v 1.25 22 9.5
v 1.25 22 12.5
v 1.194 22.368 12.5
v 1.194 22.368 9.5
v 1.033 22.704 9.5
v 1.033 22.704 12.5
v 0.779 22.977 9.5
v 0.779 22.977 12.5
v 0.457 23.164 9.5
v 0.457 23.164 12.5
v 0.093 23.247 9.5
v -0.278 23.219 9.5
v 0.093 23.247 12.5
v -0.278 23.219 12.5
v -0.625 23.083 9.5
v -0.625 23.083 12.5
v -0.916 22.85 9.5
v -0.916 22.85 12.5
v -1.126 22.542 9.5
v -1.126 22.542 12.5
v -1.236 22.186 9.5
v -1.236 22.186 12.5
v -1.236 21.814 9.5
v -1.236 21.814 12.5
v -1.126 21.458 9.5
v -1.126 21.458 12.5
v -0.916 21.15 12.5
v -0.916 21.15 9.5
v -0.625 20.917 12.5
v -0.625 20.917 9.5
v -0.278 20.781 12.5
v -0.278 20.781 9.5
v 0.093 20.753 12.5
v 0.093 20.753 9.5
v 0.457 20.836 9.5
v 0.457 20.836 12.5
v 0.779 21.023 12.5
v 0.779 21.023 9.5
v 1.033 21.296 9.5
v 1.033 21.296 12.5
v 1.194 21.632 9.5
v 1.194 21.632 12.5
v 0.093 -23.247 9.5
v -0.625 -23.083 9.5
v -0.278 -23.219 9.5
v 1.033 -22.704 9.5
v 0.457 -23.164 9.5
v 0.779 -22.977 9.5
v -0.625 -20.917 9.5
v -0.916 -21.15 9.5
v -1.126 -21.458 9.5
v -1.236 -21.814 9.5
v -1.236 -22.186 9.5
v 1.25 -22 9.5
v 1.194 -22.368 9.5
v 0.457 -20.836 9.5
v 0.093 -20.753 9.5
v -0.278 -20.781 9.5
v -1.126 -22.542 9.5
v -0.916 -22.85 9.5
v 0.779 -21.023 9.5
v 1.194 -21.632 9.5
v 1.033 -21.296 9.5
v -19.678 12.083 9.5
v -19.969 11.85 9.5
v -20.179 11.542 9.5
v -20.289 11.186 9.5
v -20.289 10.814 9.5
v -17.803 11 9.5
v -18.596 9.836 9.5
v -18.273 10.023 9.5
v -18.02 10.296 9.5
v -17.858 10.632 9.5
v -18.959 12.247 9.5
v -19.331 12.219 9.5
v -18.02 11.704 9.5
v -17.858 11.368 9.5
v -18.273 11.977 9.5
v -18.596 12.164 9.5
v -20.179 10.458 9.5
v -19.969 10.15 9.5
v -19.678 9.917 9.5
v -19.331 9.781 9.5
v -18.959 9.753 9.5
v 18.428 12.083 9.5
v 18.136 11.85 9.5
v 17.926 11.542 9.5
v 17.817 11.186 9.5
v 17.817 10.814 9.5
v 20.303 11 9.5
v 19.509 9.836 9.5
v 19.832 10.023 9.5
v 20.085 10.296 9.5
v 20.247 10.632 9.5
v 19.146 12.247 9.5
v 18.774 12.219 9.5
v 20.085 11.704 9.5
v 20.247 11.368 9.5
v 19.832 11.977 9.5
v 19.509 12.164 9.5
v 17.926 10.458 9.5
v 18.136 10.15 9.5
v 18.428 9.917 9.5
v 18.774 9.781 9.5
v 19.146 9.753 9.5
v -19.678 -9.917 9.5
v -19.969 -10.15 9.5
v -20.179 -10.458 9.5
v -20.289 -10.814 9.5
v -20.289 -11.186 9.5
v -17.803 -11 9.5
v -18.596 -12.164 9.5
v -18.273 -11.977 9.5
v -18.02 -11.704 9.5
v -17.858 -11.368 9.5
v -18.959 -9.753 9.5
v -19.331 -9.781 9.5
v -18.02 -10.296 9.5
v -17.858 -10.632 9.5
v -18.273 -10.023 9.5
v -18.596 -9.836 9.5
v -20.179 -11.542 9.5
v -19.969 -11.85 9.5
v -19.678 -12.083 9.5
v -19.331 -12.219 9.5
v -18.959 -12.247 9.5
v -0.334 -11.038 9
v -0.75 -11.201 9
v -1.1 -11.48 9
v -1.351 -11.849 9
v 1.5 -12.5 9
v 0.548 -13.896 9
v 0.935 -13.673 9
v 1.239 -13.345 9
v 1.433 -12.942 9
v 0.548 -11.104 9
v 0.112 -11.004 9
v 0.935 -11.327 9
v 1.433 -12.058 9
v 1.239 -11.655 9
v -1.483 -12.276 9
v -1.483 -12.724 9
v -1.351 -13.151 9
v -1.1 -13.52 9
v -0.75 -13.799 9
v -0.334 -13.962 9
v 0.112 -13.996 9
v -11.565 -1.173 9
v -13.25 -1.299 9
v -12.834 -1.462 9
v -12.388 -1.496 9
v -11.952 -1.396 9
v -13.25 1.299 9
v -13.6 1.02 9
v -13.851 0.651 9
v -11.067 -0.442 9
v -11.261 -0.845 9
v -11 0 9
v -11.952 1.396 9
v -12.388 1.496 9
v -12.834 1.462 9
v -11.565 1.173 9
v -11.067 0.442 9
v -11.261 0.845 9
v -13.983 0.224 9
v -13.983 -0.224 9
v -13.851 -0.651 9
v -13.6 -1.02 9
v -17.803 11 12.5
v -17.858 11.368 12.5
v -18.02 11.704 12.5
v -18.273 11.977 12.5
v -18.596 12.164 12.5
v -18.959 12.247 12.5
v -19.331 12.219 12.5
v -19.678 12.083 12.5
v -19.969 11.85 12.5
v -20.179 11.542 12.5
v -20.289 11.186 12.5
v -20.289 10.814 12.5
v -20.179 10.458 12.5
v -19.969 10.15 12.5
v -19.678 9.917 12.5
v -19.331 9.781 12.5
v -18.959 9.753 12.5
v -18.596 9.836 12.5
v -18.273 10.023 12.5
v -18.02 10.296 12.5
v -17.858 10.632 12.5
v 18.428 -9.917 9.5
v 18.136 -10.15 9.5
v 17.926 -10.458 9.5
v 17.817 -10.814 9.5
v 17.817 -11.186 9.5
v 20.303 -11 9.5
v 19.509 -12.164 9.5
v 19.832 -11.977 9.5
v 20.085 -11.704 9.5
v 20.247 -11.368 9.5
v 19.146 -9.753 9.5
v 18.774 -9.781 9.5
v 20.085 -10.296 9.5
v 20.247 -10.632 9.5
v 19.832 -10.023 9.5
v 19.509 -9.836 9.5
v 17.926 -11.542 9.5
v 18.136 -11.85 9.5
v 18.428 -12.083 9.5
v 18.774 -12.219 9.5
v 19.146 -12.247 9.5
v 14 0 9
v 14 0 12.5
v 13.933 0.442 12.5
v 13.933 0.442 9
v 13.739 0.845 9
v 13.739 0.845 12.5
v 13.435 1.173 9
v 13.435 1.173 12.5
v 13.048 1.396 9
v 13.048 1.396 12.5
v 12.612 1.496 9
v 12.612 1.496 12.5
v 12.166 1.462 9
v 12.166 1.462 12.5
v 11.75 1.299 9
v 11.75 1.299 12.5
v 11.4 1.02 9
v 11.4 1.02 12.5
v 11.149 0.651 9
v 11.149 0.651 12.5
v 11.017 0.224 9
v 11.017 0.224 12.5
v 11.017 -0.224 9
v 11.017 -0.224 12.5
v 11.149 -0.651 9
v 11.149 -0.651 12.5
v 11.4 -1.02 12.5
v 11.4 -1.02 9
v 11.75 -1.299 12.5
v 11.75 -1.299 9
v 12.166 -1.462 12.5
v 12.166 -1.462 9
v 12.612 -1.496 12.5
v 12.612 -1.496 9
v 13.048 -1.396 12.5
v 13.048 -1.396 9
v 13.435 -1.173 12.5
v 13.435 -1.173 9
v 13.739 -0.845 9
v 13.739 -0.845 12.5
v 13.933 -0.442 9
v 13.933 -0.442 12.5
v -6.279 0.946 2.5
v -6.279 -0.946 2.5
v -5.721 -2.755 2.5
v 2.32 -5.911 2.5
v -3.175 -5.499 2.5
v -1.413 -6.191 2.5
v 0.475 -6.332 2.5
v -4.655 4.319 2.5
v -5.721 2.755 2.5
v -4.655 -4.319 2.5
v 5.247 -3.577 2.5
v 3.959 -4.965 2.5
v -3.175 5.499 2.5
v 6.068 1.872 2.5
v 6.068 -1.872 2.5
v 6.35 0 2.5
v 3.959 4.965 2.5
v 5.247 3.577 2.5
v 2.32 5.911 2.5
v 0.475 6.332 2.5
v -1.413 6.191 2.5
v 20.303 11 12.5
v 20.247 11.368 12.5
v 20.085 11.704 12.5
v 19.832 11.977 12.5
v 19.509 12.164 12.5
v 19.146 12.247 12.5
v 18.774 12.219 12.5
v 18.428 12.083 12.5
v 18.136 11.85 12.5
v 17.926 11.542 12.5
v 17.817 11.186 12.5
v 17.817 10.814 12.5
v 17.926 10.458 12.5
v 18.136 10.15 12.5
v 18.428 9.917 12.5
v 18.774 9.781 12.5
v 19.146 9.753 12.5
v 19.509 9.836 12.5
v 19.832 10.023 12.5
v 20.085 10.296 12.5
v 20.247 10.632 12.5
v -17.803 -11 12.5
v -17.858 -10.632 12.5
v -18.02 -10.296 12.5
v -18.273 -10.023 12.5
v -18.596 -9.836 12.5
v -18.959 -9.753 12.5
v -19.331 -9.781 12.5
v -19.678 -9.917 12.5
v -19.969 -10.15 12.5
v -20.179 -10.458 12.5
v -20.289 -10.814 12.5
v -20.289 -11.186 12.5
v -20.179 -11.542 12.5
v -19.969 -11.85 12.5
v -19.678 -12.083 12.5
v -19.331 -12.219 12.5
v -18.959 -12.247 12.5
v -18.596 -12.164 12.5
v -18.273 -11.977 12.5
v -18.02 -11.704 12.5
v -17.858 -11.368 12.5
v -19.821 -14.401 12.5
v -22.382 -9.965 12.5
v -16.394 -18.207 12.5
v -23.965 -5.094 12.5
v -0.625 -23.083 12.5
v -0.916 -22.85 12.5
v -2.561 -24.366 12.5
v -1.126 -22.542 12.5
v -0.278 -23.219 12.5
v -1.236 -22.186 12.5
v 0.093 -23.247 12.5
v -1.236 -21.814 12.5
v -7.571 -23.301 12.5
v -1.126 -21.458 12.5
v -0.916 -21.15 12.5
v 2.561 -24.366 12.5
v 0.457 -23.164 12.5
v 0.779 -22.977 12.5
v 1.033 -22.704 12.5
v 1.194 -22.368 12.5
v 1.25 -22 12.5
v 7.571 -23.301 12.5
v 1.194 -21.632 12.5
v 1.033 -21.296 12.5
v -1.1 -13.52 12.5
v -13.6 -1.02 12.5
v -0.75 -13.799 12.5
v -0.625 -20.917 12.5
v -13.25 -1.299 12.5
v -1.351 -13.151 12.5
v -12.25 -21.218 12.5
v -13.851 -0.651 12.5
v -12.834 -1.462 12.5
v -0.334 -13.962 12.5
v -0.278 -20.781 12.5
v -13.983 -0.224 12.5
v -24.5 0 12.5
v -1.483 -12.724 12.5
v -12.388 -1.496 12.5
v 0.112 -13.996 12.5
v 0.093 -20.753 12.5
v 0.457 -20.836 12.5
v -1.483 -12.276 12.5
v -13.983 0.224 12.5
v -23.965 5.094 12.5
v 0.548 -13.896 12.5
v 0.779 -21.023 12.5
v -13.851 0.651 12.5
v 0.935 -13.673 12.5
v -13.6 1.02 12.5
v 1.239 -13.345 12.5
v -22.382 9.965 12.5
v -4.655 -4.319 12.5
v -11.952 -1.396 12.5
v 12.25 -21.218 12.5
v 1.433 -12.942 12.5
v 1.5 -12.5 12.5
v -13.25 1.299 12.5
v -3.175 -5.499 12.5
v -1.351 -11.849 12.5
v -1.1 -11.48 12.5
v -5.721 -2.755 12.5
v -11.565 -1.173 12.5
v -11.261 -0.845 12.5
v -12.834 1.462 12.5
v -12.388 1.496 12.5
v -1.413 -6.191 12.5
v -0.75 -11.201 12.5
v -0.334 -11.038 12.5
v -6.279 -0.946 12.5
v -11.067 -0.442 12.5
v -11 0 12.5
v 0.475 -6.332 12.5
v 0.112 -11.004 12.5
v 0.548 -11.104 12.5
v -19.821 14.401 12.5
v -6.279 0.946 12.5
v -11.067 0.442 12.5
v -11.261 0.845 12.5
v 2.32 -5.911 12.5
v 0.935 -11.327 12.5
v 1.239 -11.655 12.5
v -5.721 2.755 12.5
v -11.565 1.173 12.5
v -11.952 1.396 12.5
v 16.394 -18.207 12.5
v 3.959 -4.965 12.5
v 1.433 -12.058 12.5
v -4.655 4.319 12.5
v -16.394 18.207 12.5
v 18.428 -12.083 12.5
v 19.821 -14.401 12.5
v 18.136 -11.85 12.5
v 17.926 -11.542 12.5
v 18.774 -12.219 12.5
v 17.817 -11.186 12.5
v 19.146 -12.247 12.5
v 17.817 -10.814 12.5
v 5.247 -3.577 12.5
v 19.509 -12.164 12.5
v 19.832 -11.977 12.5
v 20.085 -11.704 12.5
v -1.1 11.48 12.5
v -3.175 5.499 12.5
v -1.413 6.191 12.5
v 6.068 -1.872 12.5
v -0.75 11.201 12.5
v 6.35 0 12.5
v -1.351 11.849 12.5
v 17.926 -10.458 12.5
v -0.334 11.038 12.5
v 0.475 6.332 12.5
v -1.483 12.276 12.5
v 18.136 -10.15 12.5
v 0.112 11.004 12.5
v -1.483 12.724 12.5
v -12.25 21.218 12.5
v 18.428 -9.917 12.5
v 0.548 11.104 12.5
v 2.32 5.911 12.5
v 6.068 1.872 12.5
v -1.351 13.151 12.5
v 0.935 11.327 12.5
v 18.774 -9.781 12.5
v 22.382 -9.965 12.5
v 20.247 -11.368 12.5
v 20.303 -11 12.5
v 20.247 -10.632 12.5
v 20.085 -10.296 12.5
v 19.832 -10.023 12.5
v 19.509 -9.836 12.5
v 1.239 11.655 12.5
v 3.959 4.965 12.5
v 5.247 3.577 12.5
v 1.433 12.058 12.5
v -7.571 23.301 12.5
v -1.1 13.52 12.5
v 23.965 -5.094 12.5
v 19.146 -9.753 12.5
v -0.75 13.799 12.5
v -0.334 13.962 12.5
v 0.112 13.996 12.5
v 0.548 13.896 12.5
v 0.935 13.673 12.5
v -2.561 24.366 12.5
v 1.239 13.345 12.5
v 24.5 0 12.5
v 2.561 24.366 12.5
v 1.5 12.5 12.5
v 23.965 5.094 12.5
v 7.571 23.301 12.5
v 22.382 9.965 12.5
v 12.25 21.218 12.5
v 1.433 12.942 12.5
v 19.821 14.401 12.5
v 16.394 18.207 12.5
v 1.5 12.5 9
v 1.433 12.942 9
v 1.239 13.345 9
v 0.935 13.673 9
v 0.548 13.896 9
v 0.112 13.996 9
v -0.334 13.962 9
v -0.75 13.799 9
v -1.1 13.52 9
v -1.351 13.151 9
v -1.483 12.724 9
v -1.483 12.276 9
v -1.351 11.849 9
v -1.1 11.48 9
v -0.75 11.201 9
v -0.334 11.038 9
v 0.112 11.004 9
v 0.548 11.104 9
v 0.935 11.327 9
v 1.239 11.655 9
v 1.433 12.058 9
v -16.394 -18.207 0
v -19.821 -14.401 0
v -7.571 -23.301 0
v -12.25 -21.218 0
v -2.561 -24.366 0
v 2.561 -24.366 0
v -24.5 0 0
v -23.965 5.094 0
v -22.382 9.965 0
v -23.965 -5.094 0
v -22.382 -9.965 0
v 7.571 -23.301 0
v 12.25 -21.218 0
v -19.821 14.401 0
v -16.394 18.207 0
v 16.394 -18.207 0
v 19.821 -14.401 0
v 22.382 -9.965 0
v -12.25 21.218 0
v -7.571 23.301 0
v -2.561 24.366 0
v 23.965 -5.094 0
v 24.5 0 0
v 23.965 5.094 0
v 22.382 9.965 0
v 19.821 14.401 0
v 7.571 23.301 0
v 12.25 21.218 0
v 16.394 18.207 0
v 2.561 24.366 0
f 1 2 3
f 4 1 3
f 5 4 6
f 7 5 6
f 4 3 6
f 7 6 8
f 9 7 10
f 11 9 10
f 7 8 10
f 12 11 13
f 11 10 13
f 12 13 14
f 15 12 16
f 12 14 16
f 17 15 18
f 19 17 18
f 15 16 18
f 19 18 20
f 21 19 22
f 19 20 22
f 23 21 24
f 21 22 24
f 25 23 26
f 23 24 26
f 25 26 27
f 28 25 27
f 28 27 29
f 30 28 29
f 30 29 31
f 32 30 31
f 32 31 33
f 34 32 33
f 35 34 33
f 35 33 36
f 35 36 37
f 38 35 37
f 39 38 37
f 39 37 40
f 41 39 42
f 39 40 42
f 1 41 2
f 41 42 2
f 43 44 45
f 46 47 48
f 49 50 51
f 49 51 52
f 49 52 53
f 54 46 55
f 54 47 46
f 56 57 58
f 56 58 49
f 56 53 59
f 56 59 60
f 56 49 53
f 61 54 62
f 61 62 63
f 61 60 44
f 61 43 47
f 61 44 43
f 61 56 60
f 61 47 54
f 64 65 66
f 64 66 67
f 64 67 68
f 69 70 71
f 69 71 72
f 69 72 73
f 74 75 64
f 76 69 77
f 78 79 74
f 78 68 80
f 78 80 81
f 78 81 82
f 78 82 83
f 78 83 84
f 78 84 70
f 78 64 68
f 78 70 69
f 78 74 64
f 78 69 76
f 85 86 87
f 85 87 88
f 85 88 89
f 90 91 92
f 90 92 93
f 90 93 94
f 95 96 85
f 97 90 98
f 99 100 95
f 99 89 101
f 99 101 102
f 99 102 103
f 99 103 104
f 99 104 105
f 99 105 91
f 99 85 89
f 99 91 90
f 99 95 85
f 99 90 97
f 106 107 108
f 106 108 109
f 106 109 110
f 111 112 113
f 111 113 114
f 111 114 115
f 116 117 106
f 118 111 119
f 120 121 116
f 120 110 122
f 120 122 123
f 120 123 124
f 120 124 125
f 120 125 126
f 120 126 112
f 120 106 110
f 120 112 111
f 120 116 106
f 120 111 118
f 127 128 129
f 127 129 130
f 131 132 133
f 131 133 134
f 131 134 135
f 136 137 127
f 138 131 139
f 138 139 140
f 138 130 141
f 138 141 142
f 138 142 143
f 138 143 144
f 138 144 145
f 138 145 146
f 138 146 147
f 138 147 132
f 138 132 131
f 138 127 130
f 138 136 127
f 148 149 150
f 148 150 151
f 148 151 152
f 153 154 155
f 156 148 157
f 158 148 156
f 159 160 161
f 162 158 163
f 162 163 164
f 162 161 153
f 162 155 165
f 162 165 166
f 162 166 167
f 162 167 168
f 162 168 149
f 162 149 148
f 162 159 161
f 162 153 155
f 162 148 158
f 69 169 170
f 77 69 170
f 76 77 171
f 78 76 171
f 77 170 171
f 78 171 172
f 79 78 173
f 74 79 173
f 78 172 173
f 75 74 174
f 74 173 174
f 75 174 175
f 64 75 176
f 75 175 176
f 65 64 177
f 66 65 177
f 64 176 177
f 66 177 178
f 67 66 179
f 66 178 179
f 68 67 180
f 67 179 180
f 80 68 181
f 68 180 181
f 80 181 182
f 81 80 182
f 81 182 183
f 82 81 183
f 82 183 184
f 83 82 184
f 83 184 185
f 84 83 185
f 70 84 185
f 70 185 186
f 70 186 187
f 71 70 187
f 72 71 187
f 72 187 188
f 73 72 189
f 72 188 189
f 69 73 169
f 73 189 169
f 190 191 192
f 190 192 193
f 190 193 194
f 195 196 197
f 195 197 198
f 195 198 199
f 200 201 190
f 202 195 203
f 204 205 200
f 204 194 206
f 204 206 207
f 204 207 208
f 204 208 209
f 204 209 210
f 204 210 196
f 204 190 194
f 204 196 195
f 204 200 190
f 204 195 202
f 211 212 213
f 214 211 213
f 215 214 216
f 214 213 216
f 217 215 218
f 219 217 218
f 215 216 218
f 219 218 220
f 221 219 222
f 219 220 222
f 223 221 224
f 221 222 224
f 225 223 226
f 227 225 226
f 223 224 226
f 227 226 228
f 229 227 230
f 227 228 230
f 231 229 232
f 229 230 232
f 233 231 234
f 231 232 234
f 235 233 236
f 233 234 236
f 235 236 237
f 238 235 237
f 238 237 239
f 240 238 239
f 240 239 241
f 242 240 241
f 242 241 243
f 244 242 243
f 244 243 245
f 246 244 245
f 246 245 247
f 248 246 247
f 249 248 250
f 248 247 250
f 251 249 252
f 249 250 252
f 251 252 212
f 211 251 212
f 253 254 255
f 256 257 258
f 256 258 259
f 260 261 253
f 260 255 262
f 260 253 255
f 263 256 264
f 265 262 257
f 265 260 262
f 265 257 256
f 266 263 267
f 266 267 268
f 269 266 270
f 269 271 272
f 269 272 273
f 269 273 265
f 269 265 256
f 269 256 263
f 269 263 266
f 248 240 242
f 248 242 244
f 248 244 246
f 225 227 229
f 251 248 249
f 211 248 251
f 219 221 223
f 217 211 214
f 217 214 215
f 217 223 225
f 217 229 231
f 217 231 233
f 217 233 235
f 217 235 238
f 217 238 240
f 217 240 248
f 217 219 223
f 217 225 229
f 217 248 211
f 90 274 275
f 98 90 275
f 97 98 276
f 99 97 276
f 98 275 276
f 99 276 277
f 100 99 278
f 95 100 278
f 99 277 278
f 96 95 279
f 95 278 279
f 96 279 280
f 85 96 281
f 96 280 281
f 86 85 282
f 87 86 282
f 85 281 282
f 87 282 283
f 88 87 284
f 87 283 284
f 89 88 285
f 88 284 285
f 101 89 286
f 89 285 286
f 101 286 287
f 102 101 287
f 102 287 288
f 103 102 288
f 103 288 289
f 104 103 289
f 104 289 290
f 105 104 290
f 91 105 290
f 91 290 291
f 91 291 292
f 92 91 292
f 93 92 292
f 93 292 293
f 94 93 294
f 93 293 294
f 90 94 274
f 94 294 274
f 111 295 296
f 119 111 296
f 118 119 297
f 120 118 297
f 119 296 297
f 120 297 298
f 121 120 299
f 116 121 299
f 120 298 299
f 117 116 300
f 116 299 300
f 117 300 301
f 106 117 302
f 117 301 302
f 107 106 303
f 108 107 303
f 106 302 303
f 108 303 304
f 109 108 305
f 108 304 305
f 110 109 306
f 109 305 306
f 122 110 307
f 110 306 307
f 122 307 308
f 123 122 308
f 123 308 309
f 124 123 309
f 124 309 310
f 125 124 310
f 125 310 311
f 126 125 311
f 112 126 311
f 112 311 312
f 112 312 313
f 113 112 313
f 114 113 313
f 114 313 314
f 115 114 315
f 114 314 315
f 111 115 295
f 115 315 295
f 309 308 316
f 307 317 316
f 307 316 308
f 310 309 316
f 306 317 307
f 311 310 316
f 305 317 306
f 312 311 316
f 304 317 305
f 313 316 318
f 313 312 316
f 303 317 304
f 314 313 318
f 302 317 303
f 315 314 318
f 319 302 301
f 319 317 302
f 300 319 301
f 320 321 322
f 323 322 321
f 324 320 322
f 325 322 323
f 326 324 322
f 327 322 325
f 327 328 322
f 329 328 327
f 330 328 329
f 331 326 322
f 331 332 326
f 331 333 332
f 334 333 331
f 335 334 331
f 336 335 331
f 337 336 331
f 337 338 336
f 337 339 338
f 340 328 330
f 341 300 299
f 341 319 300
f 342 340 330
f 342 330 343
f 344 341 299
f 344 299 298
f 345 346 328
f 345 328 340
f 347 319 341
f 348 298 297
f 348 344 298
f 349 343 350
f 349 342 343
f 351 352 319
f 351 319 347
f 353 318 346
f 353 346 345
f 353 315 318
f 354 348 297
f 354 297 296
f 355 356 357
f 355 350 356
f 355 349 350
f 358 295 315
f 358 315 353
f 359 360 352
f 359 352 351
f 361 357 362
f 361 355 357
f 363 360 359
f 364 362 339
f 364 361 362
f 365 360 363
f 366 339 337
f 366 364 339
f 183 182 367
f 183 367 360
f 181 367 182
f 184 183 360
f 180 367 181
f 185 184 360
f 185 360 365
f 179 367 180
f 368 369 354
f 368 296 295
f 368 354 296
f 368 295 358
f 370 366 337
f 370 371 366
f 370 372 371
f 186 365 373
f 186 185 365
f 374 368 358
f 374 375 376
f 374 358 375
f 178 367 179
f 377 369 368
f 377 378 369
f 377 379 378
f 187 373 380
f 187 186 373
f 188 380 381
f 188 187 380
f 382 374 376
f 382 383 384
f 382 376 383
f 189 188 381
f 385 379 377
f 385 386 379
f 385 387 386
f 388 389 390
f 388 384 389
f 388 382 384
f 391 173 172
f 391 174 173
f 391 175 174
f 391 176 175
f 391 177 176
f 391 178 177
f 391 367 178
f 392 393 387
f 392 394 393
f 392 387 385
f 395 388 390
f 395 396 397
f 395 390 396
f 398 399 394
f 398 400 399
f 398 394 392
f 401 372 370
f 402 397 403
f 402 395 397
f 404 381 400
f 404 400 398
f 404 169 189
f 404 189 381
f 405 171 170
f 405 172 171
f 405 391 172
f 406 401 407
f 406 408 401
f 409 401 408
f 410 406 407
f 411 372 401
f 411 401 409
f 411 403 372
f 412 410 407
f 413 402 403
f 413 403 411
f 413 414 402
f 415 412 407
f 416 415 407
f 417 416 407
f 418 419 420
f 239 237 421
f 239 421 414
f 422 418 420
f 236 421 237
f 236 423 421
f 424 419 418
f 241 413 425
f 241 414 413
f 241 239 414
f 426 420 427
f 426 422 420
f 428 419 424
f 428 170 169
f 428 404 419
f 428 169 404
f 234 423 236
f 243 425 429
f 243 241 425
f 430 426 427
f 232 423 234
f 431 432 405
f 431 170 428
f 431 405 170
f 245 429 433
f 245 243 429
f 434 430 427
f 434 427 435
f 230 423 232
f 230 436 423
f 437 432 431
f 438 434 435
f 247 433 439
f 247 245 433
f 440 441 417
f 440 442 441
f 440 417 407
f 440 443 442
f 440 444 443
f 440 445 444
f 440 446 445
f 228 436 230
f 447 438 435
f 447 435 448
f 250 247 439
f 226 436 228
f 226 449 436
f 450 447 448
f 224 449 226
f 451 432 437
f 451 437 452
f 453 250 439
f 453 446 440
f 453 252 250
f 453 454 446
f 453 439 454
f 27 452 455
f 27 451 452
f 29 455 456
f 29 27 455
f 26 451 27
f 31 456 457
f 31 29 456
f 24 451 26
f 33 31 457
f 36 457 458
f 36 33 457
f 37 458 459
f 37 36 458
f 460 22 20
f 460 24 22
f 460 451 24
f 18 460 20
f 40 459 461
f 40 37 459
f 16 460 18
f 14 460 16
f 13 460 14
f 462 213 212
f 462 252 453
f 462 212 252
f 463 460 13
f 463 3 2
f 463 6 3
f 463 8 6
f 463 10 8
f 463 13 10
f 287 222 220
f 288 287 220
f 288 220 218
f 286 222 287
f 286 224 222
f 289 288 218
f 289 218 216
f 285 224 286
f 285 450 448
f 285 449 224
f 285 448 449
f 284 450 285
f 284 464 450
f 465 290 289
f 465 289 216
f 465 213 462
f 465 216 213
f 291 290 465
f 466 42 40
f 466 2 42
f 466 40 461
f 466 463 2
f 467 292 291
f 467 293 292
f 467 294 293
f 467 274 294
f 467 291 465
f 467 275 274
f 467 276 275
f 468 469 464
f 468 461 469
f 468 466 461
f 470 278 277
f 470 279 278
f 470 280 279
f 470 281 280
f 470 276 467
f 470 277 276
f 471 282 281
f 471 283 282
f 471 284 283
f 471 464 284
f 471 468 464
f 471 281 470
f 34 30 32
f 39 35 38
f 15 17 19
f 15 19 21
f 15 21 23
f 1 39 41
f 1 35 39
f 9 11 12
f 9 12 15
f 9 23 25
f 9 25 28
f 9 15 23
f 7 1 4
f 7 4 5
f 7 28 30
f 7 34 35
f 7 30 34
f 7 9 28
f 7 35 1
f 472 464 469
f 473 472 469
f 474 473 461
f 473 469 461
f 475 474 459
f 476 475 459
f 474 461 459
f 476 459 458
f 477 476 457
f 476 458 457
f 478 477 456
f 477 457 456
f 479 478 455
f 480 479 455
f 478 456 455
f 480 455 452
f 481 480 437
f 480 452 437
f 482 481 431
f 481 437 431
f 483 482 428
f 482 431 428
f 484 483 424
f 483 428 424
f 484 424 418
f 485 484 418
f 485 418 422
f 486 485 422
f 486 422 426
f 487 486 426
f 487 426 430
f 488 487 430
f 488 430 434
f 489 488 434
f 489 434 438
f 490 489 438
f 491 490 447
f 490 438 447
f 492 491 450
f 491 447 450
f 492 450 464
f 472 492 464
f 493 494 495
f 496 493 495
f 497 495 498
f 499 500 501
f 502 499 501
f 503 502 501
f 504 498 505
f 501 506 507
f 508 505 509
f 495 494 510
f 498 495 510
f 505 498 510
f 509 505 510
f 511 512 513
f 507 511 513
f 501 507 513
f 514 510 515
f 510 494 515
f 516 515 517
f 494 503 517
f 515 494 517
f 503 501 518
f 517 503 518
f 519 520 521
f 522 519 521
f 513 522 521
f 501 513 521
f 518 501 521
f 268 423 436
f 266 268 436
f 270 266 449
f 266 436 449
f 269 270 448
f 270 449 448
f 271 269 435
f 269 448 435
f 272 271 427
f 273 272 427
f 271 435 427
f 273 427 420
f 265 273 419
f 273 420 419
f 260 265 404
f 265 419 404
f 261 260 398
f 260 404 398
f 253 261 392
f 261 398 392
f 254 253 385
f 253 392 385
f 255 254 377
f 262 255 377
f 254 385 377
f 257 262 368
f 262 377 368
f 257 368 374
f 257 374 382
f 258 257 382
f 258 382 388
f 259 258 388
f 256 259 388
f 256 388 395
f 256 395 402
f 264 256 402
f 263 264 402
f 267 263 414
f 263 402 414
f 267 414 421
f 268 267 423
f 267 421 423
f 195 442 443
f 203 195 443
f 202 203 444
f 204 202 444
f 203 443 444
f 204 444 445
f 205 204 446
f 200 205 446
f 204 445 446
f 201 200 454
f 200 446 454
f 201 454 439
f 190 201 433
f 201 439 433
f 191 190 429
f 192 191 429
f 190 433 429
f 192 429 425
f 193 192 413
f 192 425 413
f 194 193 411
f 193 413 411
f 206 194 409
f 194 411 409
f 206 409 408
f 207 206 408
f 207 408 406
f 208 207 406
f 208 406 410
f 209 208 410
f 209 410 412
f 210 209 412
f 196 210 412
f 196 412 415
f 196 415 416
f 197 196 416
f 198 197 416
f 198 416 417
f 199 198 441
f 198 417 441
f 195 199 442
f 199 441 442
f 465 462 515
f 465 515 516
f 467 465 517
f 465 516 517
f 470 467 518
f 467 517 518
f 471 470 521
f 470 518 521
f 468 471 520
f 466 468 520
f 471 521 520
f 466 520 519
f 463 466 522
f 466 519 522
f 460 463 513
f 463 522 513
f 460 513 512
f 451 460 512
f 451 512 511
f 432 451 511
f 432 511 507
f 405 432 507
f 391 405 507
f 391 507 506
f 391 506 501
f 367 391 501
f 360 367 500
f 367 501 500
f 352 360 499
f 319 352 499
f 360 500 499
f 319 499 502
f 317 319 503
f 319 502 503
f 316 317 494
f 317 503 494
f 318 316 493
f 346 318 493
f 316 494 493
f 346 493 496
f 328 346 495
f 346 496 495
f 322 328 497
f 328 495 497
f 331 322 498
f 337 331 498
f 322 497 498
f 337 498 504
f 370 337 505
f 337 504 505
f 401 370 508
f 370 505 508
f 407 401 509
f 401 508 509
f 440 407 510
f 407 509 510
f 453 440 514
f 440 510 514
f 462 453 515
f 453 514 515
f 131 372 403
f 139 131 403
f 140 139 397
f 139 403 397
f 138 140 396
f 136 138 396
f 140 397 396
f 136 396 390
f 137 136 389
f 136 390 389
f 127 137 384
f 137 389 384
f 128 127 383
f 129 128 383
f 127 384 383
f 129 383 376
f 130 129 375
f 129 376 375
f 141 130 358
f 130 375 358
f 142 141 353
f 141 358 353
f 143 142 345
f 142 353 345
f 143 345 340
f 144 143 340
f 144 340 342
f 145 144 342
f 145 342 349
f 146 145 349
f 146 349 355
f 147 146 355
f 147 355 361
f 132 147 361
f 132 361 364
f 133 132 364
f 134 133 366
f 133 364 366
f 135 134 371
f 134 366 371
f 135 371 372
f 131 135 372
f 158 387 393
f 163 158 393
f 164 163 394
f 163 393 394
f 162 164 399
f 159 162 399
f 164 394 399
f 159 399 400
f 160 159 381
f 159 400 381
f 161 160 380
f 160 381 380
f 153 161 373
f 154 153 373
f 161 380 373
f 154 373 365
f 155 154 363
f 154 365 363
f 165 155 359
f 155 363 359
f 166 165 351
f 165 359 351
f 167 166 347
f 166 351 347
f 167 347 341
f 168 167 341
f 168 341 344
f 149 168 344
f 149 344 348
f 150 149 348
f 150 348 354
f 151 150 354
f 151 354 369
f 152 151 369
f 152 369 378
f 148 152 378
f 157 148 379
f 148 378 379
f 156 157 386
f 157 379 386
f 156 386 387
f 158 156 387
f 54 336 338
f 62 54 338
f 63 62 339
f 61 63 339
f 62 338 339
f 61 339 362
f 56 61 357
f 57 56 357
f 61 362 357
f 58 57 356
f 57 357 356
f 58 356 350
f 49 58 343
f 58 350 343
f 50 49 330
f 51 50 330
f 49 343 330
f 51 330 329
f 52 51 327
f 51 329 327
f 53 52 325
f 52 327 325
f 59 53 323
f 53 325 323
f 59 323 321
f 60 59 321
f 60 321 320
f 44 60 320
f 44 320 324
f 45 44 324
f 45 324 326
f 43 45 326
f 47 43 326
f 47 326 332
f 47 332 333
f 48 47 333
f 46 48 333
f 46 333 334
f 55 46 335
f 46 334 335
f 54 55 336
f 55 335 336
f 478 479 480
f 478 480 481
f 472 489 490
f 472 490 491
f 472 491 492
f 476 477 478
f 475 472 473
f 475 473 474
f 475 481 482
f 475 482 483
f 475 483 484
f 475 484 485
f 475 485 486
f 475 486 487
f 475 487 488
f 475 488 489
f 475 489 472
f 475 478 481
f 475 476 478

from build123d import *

# Parameters (mm, degrees)
SKETCH_1_R          = 24.5
EXTRUDE_1_DEPTH     = 12.5
SKETCH_2_R          = 1.25
CUT_EXTRUDE_1_DEPTH = 3
SKETCH_3_R          = 1.5
CUT_EXTRUDE_2_DEPTH = 3.5
SKETCH_5_R          = 6.35
CUT_EXTRUDE_3_DEPTH = 10


with BuildPart() as part:
    # 草图1 → 凸台-拉伸1 (new body)
    with BuildSketch(Plane.XY):
        Circle(SKETCH_1_R)
    extrude(amount=EXTRUDE_1_DEPTH)

    # 草图2 → 切除-拉伸1 (cut)
    with BuildSketch(Plane.XY.offset(12.5)):
        with Locations((0, 22)):
            Circle(SKETCH_2_R)
        with Locations((0, -22)):
            Circle(SKETCH_2_R)
        with Locations((19.052558883, 11)):
            Circle(SKETCH_2_R)
        with Locations((-19.052558883, 11)):
            Circle(SKETCH_2_R)
        with Locations((19.052558883, -11)):
            Circle(SKETCH_2_R)
        with Locations((-19.052558883, -11)):
            Circle(SKETCH_2_R)
    extrude(amount=-CUT_EXTRUDE_1_DEPTH, mode=Mode.SUBTRACT)

    # 草图3 → 切除-拉伸2 (cut)
    with BuildSketch(Plane.XY.offset(12.5)):
        with Locations((0, 12.5)):
            Circle(SKETCH_3_R)
        with Locations((0, -12.5)):
            Circle(SKETCH_3_R)
        with Locations((12.5, 0)):
            Circle(SKETCH_3_R)
        with Locations((-12.5, 0)):
            Circle(SKETCH_3_R)
    extrude(amount=-CUT_EXTRUDE_2_DEPTH, mode=Mode.SUBTRACT)

    # 草图5 → 切除-拉伸3 (cut)
    with BuildSketch(Plane.XY.offset(12.5)):
        Circle(SKETCH_5_R)
    extrude(amount=-CUT_EXTRUDE_3_DEPTH, mode=Mode.SUBTRACT)


solid = part.part
